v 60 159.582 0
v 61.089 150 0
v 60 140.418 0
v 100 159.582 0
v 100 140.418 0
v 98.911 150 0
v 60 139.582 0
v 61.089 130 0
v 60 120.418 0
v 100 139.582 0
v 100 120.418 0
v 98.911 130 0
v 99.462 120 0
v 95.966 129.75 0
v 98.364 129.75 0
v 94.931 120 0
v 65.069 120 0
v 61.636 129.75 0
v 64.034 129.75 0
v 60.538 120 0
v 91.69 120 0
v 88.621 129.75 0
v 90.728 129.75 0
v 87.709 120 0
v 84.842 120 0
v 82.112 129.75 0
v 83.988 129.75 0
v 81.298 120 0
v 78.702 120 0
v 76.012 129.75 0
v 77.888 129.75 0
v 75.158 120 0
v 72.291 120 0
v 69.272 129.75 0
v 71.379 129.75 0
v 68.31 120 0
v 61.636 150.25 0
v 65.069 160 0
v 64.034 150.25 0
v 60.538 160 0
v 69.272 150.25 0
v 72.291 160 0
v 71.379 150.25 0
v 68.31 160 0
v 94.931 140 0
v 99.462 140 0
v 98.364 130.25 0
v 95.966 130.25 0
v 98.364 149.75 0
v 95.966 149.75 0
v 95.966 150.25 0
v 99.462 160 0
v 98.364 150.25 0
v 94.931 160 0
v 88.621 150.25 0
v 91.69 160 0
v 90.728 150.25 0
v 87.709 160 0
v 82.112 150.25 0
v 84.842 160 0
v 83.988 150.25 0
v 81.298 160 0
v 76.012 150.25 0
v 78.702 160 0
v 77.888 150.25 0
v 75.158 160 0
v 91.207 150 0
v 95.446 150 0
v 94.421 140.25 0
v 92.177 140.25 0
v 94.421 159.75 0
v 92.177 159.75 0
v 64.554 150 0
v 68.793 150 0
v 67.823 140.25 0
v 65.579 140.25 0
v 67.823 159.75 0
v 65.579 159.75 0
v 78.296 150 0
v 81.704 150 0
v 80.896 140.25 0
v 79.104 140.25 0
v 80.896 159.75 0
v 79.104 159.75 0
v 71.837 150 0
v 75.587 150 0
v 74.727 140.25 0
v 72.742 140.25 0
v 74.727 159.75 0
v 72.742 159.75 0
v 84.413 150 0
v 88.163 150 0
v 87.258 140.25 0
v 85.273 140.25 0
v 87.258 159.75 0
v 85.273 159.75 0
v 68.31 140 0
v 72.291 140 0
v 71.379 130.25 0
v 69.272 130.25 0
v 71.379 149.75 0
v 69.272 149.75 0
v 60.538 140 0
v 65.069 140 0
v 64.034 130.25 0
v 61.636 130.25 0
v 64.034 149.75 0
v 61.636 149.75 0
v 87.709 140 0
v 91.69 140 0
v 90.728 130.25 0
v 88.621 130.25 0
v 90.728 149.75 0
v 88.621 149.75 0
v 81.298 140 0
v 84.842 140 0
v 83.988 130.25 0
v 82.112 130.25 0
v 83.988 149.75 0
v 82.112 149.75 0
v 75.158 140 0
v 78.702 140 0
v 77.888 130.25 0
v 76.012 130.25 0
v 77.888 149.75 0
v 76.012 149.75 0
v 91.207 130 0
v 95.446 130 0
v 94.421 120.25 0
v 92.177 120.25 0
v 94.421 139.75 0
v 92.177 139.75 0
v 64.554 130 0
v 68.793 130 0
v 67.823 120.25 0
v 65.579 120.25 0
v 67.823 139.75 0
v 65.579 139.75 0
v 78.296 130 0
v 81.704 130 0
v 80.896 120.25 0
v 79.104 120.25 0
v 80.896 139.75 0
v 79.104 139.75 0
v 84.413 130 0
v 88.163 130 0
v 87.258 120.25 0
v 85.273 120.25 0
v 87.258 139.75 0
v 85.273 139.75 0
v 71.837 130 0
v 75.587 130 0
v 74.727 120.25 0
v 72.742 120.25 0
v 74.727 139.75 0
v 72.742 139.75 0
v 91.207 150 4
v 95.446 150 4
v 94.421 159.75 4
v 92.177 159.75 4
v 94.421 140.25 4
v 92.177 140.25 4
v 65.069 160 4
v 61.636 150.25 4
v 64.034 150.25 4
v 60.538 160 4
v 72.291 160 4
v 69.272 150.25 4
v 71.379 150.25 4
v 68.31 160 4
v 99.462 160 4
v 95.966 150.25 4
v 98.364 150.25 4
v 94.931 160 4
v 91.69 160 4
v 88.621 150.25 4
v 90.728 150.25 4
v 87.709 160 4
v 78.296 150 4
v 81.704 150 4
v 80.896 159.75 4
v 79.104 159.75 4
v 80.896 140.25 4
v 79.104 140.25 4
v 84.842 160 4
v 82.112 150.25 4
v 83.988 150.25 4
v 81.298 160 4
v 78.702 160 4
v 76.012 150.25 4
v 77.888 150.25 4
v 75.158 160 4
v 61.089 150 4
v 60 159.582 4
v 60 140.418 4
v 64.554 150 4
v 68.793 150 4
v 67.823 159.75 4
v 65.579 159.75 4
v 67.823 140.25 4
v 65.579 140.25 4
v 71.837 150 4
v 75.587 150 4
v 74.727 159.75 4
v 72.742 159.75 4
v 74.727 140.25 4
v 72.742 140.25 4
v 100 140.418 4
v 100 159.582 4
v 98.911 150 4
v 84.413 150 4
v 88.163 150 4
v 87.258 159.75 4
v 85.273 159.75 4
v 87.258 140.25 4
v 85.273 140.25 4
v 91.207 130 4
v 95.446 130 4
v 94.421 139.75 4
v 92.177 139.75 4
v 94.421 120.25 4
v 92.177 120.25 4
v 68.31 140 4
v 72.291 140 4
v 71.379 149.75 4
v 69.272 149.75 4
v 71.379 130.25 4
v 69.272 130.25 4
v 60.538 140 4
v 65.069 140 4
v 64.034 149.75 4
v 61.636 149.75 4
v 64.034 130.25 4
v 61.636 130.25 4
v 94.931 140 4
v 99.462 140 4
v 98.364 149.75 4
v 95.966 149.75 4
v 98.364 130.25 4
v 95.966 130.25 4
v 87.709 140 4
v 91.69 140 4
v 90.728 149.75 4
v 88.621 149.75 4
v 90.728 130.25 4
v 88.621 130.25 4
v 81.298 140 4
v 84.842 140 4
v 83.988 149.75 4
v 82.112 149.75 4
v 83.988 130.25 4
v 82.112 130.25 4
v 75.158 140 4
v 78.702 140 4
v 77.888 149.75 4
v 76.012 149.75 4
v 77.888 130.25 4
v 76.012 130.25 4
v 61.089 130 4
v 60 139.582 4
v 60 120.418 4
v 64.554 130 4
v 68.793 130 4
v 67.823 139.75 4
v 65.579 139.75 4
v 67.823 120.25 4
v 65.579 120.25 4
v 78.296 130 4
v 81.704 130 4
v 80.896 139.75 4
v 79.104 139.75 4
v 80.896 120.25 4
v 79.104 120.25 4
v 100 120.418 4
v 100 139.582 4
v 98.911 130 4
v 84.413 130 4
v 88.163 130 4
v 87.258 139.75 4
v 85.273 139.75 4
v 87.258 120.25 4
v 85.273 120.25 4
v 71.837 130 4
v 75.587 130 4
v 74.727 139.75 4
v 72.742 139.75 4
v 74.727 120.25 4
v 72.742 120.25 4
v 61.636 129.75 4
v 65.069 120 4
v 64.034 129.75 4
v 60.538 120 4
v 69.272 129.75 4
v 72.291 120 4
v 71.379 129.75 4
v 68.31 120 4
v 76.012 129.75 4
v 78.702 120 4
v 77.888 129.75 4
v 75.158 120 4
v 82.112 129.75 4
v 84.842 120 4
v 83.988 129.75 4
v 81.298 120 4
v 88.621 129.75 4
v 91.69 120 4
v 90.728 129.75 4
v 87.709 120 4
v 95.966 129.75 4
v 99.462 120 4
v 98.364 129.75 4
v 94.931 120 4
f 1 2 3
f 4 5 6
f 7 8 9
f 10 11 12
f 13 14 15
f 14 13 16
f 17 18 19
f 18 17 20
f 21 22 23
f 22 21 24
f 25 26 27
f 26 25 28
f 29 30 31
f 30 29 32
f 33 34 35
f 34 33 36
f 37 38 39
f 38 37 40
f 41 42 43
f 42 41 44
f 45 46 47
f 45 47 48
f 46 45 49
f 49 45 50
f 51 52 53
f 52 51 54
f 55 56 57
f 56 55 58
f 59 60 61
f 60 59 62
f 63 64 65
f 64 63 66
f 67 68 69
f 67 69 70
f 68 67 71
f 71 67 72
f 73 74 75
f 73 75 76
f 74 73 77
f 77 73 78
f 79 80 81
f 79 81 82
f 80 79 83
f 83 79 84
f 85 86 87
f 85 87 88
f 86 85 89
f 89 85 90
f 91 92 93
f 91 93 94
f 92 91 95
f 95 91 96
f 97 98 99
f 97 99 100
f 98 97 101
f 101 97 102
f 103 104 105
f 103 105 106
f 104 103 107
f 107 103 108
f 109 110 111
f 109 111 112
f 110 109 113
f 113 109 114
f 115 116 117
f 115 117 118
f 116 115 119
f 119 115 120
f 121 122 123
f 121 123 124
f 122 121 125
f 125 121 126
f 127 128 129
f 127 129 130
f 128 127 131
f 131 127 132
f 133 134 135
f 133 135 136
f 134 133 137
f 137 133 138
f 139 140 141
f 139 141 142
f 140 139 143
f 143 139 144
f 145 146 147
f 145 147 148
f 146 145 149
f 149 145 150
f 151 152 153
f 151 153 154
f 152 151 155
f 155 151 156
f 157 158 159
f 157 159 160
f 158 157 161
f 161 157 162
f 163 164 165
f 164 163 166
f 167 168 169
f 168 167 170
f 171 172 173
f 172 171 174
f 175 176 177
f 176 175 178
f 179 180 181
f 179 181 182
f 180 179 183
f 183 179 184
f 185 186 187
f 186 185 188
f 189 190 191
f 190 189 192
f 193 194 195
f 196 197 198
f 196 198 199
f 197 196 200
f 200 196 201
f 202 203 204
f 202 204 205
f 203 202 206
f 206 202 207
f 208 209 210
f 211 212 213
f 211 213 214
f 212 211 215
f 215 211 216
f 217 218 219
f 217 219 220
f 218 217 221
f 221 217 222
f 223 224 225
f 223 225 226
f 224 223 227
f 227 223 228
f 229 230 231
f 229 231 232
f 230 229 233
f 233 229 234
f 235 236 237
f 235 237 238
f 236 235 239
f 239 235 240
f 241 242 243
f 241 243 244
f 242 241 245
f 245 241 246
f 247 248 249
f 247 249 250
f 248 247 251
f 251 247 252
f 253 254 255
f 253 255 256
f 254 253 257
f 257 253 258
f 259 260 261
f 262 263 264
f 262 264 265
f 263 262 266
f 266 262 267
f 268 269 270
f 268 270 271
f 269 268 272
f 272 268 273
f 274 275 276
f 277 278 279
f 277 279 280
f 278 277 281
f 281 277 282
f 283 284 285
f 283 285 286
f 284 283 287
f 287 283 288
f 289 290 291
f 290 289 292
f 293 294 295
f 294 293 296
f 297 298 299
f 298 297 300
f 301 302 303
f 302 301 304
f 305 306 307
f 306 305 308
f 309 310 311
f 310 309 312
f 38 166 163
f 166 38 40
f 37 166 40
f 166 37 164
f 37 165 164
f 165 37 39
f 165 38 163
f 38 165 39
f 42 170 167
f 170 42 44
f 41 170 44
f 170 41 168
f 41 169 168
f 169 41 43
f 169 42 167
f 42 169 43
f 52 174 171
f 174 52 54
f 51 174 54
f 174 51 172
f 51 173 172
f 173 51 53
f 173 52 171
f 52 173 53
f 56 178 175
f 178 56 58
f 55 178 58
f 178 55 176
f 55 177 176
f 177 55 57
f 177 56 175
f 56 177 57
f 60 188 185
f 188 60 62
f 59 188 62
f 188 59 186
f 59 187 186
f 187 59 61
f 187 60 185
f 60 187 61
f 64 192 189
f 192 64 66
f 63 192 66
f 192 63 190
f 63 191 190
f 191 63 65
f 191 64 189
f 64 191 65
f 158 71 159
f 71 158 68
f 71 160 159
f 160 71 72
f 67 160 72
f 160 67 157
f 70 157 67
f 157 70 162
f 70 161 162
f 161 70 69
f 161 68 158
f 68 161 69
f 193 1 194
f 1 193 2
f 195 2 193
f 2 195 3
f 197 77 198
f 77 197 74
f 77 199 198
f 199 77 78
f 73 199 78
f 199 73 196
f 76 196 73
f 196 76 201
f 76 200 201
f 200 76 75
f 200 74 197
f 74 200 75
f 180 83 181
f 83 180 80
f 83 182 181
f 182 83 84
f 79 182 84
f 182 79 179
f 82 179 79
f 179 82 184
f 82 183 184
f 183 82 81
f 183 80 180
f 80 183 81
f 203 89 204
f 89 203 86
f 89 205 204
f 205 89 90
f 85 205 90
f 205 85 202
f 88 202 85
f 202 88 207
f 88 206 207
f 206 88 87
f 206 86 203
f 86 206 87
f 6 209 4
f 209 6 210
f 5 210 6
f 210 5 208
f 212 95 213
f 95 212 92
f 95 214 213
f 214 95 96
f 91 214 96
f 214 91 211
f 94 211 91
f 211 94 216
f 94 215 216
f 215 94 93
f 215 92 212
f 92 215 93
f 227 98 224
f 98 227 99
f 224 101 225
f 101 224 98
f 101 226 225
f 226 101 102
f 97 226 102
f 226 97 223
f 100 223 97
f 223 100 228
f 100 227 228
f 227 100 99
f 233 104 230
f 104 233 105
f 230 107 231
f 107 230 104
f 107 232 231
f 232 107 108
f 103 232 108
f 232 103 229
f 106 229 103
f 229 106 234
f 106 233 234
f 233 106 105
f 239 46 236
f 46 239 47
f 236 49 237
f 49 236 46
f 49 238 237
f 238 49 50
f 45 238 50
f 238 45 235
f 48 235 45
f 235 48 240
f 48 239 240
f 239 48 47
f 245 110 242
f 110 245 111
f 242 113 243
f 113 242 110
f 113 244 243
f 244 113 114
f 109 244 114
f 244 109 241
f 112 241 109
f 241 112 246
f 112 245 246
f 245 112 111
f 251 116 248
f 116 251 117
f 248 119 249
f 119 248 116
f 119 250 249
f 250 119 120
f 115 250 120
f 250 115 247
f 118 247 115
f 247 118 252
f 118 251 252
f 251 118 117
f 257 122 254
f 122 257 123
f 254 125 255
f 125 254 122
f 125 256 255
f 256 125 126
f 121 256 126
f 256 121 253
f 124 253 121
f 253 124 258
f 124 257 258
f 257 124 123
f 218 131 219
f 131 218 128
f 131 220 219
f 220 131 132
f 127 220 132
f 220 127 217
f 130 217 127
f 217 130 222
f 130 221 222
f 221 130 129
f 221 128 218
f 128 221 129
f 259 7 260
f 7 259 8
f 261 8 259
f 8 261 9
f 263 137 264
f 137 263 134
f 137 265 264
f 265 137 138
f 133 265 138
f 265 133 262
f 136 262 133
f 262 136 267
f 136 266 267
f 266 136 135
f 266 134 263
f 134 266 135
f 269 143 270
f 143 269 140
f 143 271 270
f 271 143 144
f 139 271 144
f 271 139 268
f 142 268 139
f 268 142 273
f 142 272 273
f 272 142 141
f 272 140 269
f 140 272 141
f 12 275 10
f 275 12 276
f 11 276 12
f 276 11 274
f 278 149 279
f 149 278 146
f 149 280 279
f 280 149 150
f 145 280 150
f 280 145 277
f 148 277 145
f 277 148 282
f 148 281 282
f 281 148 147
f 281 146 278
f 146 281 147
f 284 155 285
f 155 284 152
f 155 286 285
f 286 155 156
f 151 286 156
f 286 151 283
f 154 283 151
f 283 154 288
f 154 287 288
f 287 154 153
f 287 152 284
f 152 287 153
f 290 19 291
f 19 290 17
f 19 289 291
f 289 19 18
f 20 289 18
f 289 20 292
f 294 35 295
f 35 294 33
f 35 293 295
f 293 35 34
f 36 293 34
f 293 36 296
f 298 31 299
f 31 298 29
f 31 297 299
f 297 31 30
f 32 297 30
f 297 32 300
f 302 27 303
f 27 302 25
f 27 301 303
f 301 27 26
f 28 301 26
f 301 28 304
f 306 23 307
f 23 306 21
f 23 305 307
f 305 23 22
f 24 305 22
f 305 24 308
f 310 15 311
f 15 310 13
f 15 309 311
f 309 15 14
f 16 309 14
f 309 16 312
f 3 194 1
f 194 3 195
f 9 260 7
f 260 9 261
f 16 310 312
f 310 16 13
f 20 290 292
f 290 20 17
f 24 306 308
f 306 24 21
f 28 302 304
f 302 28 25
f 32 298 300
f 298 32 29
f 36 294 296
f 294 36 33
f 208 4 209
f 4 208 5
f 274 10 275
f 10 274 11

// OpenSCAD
$fa = 0.1;
$fs = 0.4;


spacing = 0.2 ;    // degrees
spacingAbs = 0.5; // mm
shortSide = 0.9; // degrees
arms = 0.4; // degrees
length = 20;
wallLength = 160;
wallThickness = 0.3;
hexHeight = 0.3;


module sideWall(width, height, thickness) {
    color("black") {
        cube([width, height, thickness]);
    }
}

module hexHalf(length, px0, px1, px2, px3, px4, px5, space, mirrored) {
    x0 = mirrored ? px5 : px0;
    x1 = mirrored ? px4 : px1;
    x2 = mirrored ? px3 : px2;
    x3 = mirrored ? px2 : px3;
    x4 = mirrored ? px1 : px4;
    x5 = mirrored ? px0 : px5;
    
    p0 = [x0, 0 + space / 2];
    p1 = [x1, 0 + space / 2];
    p2 = [x2, length / 2];
    p3 = [x0, length / 2];
    
    pointsSingle = [p0, p1, p2, p3];
    polygon(pointsSingle);
    
    p5 = [x3, 0];
    p6 = [x4, length / 2 - space / 2];
    p7 = [x5, length / 2 - space / 2];
    p8 = [x5, 0];
    
    pointsLowerHalf = [p5, p6, p7, p8];
    polygon(pointsLowerHalf);
}


function distance2(angle) = (sin(angle) * wallLength / 2) / sin(45 - abs(angle));

module hexes2(angle, mirrored) {
    if (angle < 22) {
        d0 = distance2(angle);
        d1 = distance2(angle + shortSide/ 2);
        d2 = distance2(angle + arms + shortSide / 2);
        
        d3 = distance2(angle + shortSide/ 2 + spacing);
        d4 = distance2(angle + shortSide/ 2 + spacing + arms);
        d5 = distance2(angle + shortSide + spacing + arms);
        
        if (d3 > -wallLength / 2){
            hexHalf(length, d0, d1, d2, d3, d4, d5, spacingAbs, mirrored);
            
            mirror([0, 1, 0]) {
                translate([0, -length, 0]) {
                    hexHalf(length, d0, d1, d2, d3, d4, d5, spacingAbs, mirrored);
                }
            }
        }
        
        hexes2(angle + arms + shortSide + spacing, !mirrored);
    }
}

module sideSlices() {
    for (n = [0 : 1 : wallLength / length - spacing]) {
        translate([wallLength / 2, length * n, 0]) {
            hexes2(-45, false);
        }
    }
}

difference() {
//difference() {
    //sideWall(wallLength, wallLength, wallThickness);


    color("white") {
        linear_extrude(height=4) {
            sideSlices();
        }
    }
//}
    cube([60, 160, 10]);
    cube([160, 120, 10]);

    translate([100, 0, 0]) {
        cube([60, 160, 10]);
    }
}
